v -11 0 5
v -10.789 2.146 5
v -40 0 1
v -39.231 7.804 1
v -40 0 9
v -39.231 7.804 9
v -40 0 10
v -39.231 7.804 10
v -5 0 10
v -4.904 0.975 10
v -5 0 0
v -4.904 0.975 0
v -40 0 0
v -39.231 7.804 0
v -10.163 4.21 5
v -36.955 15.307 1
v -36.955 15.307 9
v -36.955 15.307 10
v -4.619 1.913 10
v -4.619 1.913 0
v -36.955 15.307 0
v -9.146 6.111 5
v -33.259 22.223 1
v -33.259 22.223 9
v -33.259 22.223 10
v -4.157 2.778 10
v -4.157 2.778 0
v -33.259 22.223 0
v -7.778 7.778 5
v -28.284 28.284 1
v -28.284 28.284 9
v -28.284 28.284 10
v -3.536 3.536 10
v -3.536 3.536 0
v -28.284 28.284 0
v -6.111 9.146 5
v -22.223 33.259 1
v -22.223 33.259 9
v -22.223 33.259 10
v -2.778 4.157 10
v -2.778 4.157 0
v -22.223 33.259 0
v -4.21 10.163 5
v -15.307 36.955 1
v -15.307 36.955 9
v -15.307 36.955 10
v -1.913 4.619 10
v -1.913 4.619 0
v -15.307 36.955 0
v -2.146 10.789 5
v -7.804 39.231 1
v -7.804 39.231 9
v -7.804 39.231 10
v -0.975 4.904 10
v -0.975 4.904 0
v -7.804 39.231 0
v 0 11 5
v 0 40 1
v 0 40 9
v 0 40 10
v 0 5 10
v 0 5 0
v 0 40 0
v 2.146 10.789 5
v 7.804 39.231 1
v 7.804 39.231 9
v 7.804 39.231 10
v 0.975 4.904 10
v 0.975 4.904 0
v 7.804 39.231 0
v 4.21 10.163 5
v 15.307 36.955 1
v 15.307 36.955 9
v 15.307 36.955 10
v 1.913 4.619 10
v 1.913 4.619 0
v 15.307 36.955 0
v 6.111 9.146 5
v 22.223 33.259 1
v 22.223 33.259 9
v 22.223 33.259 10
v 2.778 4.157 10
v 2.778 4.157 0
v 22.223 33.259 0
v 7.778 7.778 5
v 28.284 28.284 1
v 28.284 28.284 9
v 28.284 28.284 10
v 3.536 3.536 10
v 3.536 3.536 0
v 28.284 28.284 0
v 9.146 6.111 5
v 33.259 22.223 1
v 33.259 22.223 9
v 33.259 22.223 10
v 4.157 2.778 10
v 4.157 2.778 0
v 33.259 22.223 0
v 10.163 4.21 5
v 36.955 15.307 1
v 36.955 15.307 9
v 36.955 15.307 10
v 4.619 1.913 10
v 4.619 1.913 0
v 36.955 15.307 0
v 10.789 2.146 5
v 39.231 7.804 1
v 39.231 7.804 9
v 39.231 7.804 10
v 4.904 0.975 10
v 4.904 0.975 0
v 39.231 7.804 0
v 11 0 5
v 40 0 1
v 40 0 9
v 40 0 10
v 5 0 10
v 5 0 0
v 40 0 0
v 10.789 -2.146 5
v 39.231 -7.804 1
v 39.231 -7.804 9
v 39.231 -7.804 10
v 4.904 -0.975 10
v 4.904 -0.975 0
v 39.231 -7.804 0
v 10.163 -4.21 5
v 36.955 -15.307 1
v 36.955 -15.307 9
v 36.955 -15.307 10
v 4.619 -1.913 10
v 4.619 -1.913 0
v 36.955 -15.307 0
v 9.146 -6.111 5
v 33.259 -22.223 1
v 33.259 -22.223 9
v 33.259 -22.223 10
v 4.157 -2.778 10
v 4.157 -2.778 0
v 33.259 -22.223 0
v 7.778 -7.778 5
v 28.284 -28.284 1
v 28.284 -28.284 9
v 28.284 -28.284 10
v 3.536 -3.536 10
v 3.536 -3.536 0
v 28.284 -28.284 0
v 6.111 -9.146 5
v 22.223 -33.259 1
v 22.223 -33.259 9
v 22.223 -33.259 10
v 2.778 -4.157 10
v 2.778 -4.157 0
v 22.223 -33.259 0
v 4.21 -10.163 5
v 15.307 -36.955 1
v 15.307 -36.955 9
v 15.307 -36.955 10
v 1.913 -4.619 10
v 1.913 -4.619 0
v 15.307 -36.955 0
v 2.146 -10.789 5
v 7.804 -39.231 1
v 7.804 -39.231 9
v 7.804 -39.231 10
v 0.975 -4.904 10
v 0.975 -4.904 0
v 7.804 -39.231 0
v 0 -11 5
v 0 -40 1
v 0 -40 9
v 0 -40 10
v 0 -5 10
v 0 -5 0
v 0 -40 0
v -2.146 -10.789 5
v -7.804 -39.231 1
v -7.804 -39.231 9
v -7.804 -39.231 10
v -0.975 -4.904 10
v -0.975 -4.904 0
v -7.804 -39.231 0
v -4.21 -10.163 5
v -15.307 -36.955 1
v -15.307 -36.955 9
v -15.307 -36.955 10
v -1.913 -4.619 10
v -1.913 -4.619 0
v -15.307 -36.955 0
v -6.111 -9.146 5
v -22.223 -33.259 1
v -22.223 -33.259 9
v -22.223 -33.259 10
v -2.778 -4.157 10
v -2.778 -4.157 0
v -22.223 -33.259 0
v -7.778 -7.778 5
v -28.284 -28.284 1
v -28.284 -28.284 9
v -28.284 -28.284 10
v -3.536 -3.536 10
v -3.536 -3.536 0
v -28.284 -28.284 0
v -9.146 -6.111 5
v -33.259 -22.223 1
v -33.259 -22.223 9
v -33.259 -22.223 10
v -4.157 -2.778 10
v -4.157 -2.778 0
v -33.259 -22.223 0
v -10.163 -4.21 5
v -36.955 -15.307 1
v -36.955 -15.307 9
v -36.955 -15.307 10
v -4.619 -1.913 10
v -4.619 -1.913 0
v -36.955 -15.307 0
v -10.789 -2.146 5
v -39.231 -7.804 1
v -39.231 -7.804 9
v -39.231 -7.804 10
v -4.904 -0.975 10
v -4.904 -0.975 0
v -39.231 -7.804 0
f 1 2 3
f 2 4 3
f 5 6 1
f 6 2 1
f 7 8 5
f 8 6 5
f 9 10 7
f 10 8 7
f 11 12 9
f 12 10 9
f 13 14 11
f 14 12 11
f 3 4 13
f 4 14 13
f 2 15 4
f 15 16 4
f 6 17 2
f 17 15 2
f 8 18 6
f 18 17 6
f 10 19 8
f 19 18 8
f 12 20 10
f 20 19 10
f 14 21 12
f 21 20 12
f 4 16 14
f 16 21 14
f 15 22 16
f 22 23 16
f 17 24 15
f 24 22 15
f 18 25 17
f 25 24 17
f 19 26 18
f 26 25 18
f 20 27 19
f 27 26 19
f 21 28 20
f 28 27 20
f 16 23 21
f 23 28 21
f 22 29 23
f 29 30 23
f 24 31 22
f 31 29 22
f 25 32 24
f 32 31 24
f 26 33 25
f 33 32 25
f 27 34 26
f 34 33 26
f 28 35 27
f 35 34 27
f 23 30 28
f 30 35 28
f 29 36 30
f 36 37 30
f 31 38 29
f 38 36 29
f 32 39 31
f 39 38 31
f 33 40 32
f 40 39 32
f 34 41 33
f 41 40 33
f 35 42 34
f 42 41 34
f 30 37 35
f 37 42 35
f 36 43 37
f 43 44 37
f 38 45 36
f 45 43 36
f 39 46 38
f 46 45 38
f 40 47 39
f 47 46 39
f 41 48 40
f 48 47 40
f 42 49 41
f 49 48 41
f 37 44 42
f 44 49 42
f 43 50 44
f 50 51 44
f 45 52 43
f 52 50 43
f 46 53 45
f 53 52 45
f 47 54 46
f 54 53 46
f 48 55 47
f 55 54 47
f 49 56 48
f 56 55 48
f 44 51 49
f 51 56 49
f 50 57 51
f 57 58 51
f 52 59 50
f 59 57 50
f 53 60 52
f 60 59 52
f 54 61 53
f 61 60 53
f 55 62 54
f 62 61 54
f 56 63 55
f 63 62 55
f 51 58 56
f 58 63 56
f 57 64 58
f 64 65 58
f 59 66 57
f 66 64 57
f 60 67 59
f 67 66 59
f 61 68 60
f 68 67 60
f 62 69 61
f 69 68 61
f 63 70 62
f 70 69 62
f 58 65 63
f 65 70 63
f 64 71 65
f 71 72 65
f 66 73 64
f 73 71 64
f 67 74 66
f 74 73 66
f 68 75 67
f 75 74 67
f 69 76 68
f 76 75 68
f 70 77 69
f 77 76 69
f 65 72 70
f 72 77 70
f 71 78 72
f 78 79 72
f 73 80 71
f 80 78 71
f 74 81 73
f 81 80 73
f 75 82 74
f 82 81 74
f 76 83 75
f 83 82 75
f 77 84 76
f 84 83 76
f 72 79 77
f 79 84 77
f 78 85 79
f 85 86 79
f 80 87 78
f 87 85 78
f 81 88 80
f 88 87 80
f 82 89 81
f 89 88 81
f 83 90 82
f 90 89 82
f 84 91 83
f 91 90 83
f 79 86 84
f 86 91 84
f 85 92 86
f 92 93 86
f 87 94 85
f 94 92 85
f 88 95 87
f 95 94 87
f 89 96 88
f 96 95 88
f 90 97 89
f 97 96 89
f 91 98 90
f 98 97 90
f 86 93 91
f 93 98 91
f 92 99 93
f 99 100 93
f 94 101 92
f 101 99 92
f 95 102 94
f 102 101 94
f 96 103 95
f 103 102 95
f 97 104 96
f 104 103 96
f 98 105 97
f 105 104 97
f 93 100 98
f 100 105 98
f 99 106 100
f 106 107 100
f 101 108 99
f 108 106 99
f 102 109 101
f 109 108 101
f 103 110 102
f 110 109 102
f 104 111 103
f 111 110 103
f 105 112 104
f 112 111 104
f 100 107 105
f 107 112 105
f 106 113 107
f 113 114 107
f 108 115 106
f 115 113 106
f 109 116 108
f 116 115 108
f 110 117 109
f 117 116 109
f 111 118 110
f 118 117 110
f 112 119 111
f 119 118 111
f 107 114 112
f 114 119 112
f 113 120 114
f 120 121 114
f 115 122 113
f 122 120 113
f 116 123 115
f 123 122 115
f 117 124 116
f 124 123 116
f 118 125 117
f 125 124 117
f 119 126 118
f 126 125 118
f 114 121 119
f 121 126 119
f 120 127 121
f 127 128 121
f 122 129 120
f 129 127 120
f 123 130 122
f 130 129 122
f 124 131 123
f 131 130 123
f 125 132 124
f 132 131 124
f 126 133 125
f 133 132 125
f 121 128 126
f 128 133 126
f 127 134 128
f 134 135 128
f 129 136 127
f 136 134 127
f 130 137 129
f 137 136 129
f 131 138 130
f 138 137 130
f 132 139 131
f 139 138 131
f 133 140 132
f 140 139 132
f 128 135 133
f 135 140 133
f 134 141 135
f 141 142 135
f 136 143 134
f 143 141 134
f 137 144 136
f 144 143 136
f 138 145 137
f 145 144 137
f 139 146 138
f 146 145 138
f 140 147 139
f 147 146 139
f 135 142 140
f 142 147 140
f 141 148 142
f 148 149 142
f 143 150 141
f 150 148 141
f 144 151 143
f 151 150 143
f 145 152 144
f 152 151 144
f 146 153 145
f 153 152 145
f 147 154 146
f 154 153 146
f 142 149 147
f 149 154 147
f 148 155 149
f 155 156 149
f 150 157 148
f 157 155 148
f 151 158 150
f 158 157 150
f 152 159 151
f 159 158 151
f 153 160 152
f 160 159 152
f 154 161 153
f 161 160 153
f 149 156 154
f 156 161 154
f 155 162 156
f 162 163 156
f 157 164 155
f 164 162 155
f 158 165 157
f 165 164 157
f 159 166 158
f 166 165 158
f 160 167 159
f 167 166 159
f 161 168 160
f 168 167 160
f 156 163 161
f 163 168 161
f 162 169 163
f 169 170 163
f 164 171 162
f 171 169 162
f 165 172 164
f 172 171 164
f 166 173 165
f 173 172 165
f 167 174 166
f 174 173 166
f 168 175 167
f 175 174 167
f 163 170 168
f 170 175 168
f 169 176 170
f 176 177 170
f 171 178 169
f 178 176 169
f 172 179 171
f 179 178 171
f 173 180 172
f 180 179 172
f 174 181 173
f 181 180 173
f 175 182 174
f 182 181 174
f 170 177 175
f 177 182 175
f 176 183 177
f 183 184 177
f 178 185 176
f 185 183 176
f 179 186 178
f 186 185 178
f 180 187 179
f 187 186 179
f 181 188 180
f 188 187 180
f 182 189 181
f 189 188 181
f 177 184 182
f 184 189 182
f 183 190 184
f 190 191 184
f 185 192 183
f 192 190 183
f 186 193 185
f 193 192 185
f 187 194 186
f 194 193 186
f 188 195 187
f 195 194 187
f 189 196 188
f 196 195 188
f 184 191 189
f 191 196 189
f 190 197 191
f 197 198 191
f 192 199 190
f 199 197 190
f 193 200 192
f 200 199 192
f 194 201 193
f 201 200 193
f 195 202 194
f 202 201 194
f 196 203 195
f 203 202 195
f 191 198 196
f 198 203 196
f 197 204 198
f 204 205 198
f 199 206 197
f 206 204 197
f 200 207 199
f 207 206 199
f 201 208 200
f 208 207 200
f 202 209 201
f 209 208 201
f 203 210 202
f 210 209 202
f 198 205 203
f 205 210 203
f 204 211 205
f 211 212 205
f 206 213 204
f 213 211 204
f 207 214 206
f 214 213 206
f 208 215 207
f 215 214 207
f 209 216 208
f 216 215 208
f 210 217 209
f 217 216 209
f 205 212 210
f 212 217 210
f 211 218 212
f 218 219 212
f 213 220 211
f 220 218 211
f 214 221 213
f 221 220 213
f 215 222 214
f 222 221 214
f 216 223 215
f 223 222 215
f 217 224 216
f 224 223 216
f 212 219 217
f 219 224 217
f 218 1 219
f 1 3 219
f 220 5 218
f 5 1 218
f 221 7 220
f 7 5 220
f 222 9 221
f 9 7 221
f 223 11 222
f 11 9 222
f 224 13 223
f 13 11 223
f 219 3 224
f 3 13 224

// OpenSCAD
$fn = 32;

// ----------------------------------------------------------------------
// Revolved part: V-groove pulley R40
// ----------------------------------------------------------------------

// --- parameters (mm) ---
bore_r = 5;               // bore radius
rim_r = 40;               // rim radius
rim_t = 10;               // rim width
groove_r = 11;            // groove root radius
groove_w = 4;             // groove half width
revolve_angle = 360;      // revolve sweep, degrees

bore_d = 2 * bore_r;
rim_d = 2 * rim_r;
groove_d = 2 * groove_r;

profile = [[5, 0], [40, 0], [40, 1], [11, 5], [40, 9], [40, 10], [5, 10]];  // primary outline, 7 points, counter clockwise

// --- the one profile operation ---
rotate_extrude(angle = revolve_angle) polygon(points = profile);
